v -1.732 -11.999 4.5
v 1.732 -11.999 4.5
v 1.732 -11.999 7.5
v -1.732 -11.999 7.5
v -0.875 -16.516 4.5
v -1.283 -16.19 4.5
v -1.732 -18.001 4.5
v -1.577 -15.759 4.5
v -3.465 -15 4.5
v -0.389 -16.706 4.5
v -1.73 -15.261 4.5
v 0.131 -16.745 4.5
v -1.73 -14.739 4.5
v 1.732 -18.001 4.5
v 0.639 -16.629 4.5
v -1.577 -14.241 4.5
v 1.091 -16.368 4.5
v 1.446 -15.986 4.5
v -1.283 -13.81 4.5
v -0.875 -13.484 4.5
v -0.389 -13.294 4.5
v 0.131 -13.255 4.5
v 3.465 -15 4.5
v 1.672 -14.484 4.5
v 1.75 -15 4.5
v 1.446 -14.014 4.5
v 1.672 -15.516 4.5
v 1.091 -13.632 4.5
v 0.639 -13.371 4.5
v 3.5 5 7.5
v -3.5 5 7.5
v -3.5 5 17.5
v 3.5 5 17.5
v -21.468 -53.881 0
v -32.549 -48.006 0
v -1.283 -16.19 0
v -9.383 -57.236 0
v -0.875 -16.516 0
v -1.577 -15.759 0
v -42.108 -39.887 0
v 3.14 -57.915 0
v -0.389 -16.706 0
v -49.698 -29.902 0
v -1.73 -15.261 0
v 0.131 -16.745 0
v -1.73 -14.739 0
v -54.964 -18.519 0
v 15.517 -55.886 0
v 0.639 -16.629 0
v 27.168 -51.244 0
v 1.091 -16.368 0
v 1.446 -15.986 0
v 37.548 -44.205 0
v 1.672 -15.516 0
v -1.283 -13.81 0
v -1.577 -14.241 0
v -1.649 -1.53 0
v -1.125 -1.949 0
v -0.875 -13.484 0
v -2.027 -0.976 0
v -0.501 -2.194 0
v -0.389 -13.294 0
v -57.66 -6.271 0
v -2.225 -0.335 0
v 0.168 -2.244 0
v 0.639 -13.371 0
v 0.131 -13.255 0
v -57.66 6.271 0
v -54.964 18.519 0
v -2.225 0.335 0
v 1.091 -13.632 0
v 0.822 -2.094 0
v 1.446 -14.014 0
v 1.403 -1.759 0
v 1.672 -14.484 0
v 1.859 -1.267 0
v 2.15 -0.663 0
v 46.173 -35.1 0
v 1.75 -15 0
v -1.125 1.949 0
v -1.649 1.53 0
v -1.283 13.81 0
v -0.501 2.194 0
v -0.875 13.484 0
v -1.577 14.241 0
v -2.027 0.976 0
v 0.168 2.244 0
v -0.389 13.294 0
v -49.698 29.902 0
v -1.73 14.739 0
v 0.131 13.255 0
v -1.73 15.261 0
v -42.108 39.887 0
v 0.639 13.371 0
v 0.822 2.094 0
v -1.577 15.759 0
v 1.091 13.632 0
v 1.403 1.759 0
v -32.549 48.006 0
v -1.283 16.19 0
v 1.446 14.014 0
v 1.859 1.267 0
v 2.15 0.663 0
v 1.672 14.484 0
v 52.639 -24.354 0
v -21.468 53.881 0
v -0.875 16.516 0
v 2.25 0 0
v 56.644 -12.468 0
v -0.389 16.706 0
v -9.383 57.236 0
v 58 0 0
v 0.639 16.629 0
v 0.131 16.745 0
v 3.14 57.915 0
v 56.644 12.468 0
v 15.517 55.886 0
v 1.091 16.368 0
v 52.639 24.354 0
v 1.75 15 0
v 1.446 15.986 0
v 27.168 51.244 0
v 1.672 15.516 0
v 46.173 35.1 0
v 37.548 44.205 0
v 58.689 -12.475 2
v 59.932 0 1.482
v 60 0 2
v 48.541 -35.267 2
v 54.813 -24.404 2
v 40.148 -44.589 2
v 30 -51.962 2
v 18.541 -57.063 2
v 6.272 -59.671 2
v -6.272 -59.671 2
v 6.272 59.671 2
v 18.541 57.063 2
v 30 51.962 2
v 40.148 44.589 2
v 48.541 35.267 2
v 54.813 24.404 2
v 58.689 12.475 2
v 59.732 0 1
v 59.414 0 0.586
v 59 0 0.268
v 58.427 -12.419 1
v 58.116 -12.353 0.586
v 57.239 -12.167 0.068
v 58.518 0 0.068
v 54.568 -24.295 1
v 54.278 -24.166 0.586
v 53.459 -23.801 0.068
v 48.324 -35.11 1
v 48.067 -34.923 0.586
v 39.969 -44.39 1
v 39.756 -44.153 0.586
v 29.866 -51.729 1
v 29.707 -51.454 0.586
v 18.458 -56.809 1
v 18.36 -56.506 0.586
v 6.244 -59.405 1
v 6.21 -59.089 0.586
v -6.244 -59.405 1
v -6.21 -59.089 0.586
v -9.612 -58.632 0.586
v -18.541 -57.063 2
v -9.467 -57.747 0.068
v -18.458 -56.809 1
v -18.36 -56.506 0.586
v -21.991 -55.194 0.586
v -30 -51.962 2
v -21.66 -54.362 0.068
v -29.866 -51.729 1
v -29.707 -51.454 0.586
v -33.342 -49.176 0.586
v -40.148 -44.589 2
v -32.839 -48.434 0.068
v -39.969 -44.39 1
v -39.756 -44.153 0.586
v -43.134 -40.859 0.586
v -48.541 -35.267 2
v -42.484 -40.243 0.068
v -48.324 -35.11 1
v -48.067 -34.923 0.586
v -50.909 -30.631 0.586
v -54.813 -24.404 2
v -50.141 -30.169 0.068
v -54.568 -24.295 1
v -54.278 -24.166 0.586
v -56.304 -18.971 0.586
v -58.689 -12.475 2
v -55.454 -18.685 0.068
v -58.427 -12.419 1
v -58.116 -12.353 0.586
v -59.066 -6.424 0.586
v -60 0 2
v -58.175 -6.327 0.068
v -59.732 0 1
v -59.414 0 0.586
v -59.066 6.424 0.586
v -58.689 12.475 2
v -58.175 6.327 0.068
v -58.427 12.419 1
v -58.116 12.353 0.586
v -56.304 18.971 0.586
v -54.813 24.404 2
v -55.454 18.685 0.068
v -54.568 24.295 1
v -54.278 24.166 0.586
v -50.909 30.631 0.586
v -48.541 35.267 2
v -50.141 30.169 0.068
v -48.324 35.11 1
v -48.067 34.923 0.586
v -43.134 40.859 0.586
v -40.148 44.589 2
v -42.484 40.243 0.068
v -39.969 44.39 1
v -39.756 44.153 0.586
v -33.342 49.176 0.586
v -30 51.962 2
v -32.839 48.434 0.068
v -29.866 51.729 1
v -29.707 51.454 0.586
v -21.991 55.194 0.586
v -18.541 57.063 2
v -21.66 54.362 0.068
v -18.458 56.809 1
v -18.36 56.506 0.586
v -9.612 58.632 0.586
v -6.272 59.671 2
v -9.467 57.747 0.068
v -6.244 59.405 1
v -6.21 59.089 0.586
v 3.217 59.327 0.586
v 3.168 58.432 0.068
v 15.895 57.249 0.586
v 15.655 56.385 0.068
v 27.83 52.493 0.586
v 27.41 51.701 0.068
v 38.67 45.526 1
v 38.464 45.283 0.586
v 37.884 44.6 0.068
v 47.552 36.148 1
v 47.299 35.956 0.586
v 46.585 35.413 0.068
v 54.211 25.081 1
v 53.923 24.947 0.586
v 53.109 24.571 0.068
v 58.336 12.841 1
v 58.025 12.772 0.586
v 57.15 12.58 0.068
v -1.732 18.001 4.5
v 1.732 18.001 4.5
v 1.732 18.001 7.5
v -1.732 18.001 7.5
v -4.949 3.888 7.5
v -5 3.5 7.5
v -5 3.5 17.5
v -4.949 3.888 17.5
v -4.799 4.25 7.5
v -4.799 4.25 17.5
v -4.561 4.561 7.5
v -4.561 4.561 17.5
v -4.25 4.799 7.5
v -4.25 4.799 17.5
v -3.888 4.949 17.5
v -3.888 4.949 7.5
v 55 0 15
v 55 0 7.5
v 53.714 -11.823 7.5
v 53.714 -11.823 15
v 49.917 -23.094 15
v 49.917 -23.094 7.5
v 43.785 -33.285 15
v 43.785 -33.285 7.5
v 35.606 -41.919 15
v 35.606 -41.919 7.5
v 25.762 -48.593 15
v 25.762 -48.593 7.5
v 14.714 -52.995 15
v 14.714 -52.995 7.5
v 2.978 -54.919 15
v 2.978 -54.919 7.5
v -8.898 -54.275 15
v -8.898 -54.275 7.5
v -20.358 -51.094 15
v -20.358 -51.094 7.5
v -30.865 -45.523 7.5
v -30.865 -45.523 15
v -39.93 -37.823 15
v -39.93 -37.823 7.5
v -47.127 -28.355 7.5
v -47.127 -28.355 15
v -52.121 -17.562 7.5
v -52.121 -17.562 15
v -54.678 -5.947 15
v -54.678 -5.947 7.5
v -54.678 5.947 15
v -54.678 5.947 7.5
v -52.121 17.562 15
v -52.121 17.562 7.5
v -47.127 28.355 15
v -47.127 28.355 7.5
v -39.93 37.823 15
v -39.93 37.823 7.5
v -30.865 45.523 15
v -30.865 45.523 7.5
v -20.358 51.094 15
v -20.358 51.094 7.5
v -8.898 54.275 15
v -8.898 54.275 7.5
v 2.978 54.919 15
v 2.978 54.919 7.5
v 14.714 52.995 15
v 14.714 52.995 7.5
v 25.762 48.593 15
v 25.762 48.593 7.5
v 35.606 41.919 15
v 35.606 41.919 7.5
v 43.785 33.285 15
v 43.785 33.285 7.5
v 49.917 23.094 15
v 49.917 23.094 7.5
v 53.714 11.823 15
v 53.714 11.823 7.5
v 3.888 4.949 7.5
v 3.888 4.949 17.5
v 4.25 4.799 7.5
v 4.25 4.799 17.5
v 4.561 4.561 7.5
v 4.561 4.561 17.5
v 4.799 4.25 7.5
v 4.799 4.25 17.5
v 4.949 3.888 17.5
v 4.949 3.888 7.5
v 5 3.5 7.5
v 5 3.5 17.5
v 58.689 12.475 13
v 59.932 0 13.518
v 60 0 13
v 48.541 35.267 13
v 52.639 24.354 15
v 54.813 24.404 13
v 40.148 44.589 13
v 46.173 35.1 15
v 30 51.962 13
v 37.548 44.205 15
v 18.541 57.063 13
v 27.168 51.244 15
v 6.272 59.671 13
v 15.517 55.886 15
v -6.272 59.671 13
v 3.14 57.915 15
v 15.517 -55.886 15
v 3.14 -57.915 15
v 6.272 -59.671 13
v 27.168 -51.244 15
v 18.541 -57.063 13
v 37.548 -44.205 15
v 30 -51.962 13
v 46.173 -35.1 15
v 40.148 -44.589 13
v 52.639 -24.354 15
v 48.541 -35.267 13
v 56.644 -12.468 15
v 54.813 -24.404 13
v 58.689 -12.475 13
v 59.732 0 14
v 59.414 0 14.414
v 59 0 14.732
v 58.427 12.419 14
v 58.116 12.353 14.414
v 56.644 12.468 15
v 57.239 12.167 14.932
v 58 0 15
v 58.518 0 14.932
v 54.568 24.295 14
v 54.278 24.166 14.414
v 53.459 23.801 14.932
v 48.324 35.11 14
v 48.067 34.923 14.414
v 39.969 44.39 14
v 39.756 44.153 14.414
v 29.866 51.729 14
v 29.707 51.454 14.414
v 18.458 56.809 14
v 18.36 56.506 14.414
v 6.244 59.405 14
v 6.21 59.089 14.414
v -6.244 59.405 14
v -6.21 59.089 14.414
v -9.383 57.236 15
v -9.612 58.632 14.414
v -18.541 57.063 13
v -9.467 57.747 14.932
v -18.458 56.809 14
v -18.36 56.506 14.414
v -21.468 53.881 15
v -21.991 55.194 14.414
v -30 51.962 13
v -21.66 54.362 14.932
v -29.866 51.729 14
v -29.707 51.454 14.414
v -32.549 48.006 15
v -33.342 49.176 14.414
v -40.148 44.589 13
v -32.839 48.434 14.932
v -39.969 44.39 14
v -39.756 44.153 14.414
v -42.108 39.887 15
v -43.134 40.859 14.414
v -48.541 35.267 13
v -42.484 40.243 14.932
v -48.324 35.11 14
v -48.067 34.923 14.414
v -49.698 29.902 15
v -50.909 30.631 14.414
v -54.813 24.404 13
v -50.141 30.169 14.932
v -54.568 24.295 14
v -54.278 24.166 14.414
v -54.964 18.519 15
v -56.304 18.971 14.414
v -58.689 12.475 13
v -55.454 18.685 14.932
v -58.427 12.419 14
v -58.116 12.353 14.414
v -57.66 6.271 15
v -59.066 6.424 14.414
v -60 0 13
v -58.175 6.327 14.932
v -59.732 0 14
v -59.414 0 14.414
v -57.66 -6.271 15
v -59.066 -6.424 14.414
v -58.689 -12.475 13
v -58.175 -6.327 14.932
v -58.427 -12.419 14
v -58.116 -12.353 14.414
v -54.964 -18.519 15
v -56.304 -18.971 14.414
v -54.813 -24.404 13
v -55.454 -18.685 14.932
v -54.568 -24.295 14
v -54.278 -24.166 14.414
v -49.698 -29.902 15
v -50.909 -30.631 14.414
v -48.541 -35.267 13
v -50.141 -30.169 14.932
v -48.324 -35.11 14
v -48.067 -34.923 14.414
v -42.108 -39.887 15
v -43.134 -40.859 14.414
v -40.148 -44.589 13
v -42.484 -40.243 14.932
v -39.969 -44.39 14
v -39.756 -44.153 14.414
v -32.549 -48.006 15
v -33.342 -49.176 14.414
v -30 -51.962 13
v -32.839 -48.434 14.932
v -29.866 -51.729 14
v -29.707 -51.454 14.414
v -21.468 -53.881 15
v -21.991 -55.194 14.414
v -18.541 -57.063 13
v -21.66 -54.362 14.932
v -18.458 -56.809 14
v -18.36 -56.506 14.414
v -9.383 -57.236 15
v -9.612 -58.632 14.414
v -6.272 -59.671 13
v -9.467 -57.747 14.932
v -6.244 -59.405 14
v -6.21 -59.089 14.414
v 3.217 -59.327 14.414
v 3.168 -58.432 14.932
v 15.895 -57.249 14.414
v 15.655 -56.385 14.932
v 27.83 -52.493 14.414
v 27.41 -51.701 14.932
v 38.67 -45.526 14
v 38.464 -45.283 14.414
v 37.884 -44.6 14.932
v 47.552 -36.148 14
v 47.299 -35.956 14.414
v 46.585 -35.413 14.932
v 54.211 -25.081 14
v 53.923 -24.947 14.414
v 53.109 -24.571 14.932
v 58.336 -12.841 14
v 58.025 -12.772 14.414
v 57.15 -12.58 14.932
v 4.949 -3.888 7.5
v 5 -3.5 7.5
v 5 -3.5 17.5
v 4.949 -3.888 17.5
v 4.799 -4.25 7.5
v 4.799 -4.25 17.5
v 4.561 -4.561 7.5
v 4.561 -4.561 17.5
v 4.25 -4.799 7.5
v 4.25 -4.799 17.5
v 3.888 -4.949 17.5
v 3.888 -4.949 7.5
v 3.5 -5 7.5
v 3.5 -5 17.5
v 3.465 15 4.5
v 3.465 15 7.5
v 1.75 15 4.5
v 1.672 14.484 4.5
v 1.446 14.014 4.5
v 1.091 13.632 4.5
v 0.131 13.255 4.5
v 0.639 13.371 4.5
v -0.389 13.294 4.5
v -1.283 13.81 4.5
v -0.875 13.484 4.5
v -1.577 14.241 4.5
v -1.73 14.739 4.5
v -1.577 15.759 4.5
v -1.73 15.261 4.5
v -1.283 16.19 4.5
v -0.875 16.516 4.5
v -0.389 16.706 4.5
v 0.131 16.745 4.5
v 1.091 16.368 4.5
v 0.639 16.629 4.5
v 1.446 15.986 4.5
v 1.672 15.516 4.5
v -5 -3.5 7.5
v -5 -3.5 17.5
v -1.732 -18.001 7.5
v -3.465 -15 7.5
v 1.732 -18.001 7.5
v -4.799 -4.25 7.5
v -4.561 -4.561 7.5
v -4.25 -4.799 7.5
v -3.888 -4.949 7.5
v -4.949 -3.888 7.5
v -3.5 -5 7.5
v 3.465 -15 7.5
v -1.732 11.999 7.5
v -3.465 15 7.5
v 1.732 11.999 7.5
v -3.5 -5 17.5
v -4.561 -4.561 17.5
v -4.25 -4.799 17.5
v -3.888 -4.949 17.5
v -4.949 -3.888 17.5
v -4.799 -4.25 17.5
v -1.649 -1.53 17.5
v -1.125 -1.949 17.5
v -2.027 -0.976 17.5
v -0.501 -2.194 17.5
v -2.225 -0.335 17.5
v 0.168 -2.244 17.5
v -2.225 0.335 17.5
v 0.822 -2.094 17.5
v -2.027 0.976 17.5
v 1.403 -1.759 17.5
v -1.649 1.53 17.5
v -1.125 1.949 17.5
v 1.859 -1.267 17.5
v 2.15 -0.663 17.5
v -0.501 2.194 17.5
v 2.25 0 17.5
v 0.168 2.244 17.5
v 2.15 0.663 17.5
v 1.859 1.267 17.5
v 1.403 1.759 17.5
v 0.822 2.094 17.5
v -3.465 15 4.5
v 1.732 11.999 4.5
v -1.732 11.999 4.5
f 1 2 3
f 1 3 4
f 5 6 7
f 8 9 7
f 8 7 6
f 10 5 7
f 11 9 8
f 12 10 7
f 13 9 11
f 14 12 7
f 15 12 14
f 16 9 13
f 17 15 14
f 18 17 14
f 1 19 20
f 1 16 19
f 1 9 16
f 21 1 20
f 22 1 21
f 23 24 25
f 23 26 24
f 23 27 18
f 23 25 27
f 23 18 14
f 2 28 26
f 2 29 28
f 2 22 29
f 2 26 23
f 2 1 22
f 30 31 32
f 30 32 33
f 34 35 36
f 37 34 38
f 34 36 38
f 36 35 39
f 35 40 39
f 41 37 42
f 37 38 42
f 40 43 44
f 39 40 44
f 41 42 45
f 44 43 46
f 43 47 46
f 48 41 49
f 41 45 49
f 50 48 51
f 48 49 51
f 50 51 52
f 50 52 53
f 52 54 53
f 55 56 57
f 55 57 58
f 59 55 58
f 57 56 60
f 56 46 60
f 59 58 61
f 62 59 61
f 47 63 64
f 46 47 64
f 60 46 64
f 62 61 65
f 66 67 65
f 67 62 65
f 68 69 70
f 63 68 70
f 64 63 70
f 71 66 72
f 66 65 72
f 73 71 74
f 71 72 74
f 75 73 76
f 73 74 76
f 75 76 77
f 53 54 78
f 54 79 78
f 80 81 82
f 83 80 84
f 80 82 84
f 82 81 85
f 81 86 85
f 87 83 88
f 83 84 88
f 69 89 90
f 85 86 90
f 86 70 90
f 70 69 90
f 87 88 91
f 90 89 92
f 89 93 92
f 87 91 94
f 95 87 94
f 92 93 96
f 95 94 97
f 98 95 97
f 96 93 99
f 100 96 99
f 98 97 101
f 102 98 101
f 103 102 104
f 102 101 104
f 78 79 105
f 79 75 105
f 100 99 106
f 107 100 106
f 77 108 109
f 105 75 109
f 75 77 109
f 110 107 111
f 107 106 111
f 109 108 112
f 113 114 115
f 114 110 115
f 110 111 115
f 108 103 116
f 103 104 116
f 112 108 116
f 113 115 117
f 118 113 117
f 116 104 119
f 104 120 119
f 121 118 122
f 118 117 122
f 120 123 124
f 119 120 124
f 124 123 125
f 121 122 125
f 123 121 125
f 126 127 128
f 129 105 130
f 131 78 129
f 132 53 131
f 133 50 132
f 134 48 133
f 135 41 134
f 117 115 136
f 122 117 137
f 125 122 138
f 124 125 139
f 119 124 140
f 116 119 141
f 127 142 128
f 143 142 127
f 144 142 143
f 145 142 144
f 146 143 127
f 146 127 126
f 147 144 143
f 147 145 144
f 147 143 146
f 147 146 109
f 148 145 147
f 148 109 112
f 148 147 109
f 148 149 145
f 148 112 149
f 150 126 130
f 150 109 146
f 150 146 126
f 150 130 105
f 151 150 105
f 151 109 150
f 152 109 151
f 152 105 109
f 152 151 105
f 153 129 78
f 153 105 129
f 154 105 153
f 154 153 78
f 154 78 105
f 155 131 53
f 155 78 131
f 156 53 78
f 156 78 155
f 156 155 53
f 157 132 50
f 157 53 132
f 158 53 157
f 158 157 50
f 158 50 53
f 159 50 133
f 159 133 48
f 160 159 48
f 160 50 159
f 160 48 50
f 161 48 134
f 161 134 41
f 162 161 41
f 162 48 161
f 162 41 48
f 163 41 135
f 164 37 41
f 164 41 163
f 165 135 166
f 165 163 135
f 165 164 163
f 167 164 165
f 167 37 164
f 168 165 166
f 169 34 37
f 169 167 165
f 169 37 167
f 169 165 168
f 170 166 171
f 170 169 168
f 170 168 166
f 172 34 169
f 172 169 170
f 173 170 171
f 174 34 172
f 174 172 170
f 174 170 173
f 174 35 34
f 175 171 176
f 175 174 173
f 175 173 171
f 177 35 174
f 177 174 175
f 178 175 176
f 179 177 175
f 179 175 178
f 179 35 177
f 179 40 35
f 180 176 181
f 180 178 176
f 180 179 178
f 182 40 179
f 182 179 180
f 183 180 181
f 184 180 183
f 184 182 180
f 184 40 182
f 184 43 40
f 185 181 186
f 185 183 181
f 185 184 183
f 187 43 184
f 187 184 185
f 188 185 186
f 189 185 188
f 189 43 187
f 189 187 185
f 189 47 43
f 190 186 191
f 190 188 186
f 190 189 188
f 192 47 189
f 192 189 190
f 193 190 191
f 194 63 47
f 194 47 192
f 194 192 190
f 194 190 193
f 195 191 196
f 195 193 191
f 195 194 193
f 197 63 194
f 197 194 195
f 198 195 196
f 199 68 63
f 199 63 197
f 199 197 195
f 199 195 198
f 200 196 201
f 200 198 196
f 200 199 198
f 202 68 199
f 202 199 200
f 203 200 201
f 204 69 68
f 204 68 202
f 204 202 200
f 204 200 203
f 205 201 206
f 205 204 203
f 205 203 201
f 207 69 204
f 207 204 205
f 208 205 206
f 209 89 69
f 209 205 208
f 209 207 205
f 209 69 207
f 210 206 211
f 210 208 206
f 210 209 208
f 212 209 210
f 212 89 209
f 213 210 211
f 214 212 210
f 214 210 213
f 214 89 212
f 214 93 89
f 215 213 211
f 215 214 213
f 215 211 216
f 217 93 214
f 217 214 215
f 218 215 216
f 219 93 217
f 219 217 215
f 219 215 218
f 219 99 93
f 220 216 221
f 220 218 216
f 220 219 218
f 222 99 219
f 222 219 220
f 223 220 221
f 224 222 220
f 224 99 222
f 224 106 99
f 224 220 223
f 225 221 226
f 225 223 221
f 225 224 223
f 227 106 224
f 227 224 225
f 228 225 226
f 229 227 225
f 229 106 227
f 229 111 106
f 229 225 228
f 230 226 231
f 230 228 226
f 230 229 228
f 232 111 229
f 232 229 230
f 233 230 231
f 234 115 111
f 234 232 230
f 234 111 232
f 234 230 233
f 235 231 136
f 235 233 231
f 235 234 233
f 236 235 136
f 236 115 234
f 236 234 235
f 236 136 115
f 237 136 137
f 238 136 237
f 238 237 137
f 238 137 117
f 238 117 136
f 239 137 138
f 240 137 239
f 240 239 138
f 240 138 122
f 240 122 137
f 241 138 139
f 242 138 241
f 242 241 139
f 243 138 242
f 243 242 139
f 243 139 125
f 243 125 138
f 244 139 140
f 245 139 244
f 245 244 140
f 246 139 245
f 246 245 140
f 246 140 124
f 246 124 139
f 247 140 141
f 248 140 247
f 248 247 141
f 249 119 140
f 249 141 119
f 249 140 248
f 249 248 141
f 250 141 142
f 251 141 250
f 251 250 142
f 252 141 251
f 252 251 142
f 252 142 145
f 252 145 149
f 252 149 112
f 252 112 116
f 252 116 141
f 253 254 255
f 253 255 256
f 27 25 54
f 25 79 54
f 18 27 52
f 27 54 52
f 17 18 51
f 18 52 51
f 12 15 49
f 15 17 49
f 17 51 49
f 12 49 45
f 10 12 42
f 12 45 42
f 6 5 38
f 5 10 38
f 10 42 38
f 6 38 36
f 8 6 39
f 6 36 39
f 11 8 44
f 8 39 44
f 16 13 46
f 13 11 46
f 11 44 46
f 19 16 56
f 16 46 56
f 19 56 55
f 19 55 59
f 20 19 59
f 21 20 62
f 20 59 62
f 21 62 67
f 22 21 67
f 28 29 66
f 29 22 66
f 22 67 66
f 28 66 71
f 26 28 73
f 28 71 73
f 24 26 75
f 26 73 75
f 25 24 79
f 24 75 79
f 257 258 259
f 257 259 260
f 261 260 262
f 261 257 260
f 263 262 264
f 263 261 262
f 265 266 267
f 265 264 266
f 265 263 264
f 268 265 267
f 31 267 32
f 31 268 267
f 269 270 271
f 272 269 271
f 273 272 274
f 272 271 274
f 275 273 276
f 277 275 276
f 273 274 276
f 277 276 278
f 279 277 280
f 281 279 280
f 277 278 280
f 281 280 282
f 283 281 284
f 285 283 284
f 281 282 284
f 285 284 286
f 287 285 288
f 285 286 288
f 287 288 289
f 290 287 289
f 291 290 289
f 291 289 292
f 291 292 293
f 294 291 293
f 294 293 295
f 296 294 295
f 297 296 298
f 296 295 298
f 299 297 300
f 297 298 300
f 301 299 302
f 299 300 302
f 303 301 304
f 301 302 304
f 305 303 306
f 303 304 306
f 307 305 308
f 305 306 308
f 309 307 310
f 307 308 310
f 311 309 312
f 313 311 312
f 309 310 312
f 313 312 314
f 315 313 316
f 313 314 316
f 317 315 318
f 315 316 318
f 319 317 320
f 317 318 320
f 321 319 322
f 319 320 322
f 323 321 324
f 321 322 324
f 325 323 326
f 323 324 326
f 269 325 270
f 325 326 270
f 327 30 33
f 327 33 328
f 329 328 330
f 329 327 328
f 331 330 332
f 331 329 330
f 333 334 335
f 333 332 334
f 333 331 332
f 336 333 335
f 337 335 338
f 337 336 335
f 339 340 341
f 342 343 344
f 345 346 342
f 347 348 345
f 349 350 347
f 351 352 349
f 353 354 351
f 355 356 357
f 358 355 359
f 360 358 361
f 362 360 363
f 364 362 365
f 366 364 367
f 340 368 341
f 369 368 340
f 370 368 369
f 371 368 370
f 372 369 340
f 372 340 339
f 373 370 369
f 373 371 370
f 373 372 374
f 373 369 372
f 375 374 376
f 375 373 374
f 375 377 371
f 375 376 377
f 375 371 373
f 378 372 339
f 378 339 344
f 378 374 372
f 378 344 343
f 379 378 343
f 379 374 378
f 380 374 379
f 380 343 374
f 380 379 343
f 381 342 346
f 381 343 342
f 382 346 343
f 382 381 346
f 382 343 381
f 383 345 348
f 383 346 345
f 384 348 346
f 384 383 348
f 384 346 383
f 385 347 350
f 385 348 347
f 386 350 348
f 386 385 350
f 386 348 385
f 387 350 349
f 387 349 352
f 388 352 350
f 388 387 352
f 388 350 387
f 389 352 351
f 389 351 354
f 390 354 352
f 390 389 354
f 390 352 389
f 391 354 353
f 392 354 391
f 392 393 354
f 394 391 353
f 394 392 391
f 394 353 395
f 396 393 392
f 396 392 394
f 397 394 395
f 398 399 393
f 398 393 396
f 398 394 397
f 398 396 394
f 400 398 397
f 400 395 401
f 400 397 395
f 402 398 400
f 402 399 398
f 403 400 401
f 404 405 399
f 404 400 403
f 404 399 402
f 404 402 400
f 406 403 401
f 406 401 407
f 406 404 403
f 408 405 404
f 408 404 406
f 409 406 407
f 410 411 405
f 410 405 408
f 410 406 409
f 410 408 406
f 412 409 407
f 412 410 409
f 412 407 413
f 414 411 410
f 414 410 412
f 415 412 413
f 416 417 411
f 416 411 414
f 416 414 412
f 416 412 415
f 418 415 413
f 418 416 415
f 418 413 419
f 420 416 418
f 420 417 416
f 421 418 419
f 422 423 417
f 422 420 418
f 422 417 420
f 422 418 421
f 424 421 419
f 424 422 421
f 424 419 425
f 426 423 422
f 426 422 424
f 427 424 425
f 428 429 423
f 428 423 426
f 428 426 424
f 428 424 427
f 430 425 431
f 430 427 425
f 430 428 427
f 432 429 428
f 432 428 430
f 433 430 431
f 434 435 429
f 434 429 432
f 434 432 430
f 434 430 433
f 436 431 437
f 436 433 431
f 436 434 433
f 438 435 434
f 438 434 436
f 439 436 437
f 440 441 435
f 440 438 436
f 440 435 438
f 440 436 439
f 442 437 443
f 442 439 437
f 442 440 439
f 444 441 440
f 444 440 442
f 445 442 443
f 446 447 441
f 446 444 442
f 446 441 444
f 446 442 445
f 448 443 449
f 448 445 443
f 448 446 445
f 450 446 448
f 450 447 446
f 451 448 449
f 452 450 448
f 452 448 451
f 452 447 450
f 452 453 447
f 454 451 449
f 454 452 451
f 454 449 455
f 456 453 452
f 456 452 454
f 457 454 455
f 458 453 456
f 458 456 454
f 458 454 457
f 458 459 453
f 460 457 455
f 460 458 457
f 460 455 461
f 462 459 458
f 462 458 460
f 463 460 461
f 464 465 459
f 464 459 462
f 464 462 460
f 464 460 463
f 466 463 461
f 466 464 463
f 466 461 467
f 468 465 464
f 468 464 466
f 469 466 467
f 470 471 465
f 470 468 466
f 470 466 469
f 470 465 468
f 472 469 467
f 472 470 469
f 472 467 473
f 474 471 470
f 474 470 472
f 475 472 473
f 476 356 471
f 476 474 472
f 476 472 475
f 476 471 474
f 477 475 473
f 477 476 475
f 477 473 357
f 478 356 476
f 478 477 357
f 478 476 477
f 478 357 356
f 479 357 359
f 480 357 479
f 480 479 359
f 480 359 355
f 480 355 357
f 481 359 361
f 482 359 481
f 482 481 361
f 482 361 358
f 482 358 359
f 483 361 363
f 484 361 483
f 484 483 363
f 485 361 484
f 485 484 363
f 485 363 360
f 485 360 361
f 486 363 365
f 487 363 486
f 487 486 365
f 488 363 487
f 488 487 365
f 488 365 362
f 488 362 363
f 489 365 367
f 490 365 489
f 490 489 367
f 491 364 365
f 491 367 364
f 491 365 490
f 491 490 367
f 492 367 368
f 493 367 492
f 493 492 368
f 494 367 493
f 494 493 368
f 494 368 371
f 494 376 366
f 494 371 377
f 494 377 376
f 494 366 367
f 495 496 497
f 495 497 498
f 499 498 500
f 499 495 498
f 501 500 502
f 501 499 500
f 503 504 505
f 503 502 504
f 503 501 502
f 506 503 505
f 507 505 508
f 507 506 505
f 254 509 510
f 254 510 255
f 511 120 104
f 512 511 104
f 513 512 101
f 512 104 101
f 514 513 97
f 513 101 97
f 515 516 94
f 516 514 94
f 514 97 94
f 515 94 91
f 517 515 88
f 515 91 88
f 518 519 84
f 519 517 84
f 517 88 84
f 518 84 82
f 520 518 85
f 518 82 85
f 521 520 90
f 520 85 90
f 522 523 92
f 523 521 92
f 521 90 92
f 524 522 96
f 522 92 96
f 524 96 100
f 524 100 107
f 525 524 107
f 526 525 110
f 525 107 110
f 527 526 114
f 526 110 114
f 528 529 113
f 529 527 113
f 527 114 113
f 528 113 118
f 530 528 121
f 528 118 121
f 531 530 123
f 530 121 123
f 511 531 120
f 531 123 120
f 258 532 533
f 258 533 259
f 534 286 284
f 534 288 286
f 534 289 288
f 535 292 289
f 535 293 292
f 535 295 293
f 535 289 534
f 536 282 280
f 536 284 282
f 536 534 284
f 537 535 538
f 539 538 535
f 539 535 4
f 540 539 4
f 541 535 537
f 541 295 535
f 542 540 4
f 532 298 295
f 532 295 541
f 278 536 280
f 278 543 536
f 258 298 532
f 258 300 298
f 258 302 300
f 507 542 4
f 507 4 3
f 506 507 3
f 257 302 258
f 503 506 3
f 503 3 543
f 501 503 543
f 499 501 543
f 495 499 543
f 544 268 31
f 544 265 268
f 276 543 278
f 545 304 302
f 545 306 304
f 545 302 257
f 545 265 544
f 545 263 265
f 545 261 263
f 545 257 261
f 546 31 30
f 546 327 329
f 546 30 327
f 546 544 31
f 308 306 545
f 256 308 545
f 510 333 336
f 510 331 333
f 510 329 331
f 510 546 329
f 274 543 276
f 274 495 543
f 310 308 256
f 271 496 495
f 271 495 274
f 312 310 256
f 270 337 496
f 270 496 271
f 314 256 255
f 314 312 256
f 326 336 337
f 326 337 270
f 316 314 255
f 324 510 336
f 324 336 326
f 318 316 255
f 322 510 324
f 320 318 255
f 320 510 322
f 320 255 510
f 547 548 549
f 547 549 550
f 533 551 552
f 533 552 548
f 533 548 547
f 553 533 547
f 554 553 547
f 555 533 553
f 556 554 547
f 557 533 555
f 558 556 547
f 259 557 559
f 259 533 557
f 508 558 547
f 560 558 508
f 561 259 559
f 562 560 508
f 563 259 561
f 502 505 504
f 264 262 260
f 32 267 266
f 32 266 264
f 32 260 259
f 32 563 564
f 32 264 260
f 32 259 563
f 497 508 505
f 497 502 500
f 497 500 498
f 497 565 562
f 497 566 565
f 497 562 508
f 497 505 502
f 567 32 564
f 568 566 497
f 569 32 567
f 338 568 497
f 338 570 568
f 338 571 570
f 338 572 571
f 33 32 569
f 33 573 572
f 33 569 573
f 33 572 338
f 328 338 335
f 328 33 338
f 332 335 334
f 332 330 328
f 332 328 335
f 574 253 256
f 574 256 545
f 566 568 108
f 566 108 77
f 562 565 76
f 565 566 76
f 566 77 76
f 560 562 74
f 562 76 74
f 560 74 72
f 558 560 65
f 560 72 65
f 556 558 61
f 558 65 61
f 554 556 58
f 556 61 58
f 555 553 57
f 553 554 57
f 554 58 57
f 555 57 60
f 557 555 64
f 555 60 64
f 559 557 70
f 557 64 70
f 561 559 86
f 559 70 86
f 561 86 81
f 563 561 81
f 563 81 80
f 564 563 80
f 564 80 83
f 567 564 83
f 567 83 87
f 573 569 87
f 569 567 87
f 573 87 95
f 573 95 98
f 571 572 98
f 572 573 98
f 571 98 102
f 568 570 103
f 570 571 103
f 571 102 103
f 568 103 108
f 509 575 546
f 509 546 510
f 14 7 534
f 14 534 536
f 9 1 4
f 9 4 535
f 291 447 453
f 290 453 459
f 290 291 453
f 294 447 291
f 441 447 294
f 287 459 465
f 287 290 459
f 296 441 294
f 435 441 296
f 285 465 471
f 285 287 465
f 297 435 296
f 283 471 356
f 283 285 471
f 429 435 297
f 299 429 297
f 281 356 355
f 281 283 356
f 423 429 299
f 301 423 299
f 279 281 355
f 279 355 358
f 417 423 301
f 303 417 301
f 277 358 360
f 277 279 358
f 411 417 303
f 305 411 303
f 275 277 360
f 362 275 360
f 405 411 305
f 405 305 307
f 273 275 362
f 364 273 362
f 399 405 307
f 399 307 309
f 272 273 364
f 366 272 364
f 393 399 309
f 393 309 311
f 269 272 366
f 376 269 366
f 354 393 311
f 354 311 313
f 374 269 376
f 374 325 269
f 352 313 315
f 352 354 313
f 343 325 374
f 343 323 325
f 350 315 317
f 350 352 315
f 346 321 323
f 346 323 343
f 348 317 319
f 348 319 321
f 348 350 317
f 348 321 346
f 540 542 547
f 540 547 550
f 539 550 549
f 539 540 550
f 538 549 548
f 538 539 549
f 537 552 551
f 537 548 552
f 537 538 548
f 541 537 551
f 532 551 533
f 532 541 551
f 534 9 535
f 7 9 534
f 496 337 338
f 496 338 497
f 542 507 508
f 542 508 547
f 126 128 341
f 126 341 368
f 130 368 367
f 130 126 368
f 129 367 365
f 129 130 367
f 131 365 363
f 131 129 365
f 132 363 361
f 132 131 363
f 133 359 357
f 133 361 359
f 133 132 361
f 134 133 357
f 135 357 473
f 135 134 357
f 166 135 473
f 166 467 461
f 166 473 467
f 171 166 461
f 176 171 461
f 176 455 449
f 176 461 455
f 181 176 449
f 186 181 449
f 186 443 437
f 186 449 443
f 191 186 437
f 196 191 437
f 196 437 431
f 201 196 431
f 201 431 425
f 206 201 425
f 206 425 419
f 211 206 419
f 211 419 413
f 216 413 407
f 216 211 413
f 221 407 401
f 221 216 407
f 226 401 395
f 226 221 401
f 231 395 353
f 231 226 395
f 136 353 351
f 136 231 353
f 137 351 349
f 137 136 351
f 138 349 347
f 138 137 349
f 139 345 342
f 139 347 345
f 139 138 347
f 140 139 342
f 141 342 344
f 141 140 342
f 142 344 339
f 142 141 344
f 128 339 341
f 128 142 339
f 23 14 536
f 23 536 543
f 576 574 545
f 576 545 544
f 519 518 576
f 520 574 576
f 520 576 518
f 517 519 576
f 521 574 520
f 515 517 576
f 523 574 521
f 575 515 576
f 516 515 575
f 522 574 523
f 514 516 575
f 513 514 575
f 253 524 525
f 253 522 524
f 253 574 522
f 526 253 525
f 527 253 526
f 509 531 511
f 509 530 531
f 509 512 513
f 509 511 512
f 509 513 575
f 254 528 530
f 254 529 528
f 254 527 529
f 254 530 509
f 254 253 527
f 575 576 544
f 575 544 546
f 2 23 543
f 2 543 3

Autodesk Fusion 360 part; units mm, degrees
sketch "main" plane through (0, 0, 0) normal (0, 0, 1) x (1, 0, 0)
  circle A0 centre (0, 0) radius 2.25
  line L0 (-3.5, 5) -> (3.5, 5)
  line L1 (5, 3.5) -> (5, -3.5)
  line L2 (3.5, -5) -> (-3.5, -5)
  line L3 (-5, -3.5) -> (-5, 3.5)
  line L4 (-5, 5) -> (5, -5) construction
  line L5 (5, 5) -> (-5, -5) construction
  arc A1 (-3.5, 5) -> (-5, 3.5) centre (-3.5, 3.5) ccw
  arc A2 (-5, -3.5) -> (-3.5, -5) centre (-3.5, -3.5) ccw
  arc A3 (3.5, -5) -> (5, -3.5) centre (3.5, -3.5) ccw
  arc A4 (5, 3.5) -> (3.5, 5) centre (3.5, 3.5) ccw
  circle A5 centre (0, 0) radius 20
  line L6 (0, 5) -> (0, 15) construction
  line L7 (0, -15) -> (0, -5) construction
  circle A6 centre (0, 15) radius 1.75
  line L8 (3.465, 15) -> (1.7325, 18.0008)
  line L9 (1.7325, 18.0008) -> (-1.7325, 18.0008)
  line L10 (-1.7325, 18.0008) -> (-3.465, 15)
  line L11 (-3.465, 15) -> (-1.7325, 11.9992)
  line L12 (-1.7325, 11.9992) -> (1.7325, 11.9992)
  line L13 (1.7325, 11.9992) -> (3.465, 15)
  circle A7 centre (0, -15) radius 1.75
  line L14 (3.465, -15) -> (1.7325, -11.9992)
  line L15 (1.7325, -11.9992) -> (-1.7325, -11.9992)
  line L16 (-1.7325, -11.9992) -> (-3.465, -15)
  line L17 (-3.465, -15) -> (-1.7325, -18.0008)
  line L18 (-1.7325, -18.0008) -> (1.7325, -18.0008)
  line L19 (1.7325, -18.0008) -> (3.465, -15)
  circle A8 centre (0, 0) radius 55
  spline S0 degree 5 poles (-5.0305, 19.357) (-4.9656, 19.5382) (-4.8376, 19.914) (-4.6506, 20.5186) (-4.4115, 21.4066) (-4.1299, 22.6499) (-3.8662, 24.0155) (-3.6214, 25.4797) (-3.3969, 26.9998) (-3.1947, 28.5187) (-3.017, 29.9798) (-2.8658, 31.3385) (-2.7432, 32.5744) (-2.6507, 33.707) (-2.5895, 34.7948) (-2.5603, 35.9102) (-2.5641, 37.1227) (-2.6015, 38.476) (-2.6738, 39.9752) (-2.7821, 41.5999) (-2.9274, 43.3124) (-3.1108, 45.0674) (-3.3328, 46.8208) (-3.5937, 48.5404) (-3.8934, 50.2058) (-4.2314, 51.805) (-4.5322, 53.0272) (-4.7748, 53.9111) (-4.944, 54.4858) (-5.0305, 54.7695) knots 0 0 0 0 0 0 0.04 0.08 0.12 0.16 0.2 0.24 0.28 0.32 0.36 0.4 0.44 0.48 0.52 0.56 0.6 0.64 0.68 0.72 0.76 0.8 0.84 0.88 0.92 0.96 1 1 1 1 1 1
  spline S1 degree 5 poles (5.0305, 19.357) (4.9656, 19.5382) (4.8376, 19.914) (4.6506, 20.5186) (4.4115, 21.4066) (4.1299, 22.6499) (3.8662, 24.0155) (3.6214, 25.4797) (3.3969, 26.9998) (3.1947, 28.5187) (3.017, 29.9798) (2.8658, 31.3385) (2.7432, 32.5744) (2.6507, 33.707) (2.5895, 34.7948) (2.5603, 35.9102) (2.5641, 37.1227) (2.6015, 38.476) (2.6738, 39.9752) (2.7821, 41.5999) (2.9274, 43.3124) (3.1108, 45.0674) (3.3328, 46.8208) (3.5937, 48.5404) (3.8934, 50.2058) (4.2314, 51.805) (4.5322, 53.0272) (4.7748, 53.9111) (4.944, 54.4858) (5.0305, 54.7695) knots 0 0 0 0 0 0 0.04 0.08 0.12 0.16 0.2 0.24 0.28 0.32 0.36 0.4 0.44 0.48 0.52 0.56 0.6 0.64 0.68 0.72 0.76 0.8 0.84 0.88 0.92 0.96 1 1 1 1 1 1
  line L20 (-5.983, 16.697) -> (-4.078, 22.017)
  line L21 (-4.0792, 51.649) -> (-5.9817, 57.8899)
  line L22 (5.983, 16.697) -> (4.078, 22.017)
  line L23 (4.0792, 51.649) -> (5.9817, 57.8899)
  circle A9 centre (0, 0) radius 60
  point P0 (0, 15)
  point P1 (0, -15)
  point P2 (-3.7631, 24.6573)
  point P3 (-2.8027, 31.9975)
  point P4 (-2.5682, 36.8246)
  point P5 (-3.1758, 45.5337)
  point P6 (3.7631, 24.6573)
  point P7 (2.8027, 31.9975)
  point P8 (2.5682, 36.8246)
  point P9 (3.1758, 45.5337)
  dimension "d1" = 4.5
  dimension "d2" = 10
  dimension "d3" = 10
  dimension "d4" = 1.5
  dimension "d5" = 40
  dimension "d6" = 10
  dimension "d7" = 10
  dimension "d8" = 3.5
  dimension "d9" = 3.465
  dimension "d10" = 3.5
  dimension "d11" = 3.465
  dimension "d12" = 110
  dimension "d23" = 120
extrude "Extrude1" add sketch "main" along normal blind 7.5 contours A5 A8 S0 S1 picked at (-13.7602, 33.1549) makes body 1
pattern_circular "C-Pattern1" count 4 over 360 about axis through (0, 0, 1.75) along (0, 0, 1) of "Extrude1" makes body 2 makes body 3 makes body 4
extrude "Extrude2" add sketch "main" along normal blind 7.5 contours A5 bodies 1 2 3 4
extrude "Extrude3" add sketch "main" along normal blind 17.5 contours L0 L1 L2 L3 A1 A2 A3 A4 bodies 1
extrude "Extrude4" add sketch "main" along normal blind 4.5 contours L8 L9 L10 L11 L12 L13 | L14 L15 L16 L17 L18 L19 bodies 1
extrude "Extrude5" add sketch "main" along normal blind 15 contours A9 bodies 1
fillet "Fillet1" radius 2 2 edges at (-55.9396, -21.6969, 0) (-55.9396, -21.6969, 15) on bodies 1
equation "d9 = ( 6.93 / 2 ) * 1 mm"
equation "d11 = ( 6.93 / 2 ) * 1 mm"
equation "d21 = 7.50 mm - 3 mm"
